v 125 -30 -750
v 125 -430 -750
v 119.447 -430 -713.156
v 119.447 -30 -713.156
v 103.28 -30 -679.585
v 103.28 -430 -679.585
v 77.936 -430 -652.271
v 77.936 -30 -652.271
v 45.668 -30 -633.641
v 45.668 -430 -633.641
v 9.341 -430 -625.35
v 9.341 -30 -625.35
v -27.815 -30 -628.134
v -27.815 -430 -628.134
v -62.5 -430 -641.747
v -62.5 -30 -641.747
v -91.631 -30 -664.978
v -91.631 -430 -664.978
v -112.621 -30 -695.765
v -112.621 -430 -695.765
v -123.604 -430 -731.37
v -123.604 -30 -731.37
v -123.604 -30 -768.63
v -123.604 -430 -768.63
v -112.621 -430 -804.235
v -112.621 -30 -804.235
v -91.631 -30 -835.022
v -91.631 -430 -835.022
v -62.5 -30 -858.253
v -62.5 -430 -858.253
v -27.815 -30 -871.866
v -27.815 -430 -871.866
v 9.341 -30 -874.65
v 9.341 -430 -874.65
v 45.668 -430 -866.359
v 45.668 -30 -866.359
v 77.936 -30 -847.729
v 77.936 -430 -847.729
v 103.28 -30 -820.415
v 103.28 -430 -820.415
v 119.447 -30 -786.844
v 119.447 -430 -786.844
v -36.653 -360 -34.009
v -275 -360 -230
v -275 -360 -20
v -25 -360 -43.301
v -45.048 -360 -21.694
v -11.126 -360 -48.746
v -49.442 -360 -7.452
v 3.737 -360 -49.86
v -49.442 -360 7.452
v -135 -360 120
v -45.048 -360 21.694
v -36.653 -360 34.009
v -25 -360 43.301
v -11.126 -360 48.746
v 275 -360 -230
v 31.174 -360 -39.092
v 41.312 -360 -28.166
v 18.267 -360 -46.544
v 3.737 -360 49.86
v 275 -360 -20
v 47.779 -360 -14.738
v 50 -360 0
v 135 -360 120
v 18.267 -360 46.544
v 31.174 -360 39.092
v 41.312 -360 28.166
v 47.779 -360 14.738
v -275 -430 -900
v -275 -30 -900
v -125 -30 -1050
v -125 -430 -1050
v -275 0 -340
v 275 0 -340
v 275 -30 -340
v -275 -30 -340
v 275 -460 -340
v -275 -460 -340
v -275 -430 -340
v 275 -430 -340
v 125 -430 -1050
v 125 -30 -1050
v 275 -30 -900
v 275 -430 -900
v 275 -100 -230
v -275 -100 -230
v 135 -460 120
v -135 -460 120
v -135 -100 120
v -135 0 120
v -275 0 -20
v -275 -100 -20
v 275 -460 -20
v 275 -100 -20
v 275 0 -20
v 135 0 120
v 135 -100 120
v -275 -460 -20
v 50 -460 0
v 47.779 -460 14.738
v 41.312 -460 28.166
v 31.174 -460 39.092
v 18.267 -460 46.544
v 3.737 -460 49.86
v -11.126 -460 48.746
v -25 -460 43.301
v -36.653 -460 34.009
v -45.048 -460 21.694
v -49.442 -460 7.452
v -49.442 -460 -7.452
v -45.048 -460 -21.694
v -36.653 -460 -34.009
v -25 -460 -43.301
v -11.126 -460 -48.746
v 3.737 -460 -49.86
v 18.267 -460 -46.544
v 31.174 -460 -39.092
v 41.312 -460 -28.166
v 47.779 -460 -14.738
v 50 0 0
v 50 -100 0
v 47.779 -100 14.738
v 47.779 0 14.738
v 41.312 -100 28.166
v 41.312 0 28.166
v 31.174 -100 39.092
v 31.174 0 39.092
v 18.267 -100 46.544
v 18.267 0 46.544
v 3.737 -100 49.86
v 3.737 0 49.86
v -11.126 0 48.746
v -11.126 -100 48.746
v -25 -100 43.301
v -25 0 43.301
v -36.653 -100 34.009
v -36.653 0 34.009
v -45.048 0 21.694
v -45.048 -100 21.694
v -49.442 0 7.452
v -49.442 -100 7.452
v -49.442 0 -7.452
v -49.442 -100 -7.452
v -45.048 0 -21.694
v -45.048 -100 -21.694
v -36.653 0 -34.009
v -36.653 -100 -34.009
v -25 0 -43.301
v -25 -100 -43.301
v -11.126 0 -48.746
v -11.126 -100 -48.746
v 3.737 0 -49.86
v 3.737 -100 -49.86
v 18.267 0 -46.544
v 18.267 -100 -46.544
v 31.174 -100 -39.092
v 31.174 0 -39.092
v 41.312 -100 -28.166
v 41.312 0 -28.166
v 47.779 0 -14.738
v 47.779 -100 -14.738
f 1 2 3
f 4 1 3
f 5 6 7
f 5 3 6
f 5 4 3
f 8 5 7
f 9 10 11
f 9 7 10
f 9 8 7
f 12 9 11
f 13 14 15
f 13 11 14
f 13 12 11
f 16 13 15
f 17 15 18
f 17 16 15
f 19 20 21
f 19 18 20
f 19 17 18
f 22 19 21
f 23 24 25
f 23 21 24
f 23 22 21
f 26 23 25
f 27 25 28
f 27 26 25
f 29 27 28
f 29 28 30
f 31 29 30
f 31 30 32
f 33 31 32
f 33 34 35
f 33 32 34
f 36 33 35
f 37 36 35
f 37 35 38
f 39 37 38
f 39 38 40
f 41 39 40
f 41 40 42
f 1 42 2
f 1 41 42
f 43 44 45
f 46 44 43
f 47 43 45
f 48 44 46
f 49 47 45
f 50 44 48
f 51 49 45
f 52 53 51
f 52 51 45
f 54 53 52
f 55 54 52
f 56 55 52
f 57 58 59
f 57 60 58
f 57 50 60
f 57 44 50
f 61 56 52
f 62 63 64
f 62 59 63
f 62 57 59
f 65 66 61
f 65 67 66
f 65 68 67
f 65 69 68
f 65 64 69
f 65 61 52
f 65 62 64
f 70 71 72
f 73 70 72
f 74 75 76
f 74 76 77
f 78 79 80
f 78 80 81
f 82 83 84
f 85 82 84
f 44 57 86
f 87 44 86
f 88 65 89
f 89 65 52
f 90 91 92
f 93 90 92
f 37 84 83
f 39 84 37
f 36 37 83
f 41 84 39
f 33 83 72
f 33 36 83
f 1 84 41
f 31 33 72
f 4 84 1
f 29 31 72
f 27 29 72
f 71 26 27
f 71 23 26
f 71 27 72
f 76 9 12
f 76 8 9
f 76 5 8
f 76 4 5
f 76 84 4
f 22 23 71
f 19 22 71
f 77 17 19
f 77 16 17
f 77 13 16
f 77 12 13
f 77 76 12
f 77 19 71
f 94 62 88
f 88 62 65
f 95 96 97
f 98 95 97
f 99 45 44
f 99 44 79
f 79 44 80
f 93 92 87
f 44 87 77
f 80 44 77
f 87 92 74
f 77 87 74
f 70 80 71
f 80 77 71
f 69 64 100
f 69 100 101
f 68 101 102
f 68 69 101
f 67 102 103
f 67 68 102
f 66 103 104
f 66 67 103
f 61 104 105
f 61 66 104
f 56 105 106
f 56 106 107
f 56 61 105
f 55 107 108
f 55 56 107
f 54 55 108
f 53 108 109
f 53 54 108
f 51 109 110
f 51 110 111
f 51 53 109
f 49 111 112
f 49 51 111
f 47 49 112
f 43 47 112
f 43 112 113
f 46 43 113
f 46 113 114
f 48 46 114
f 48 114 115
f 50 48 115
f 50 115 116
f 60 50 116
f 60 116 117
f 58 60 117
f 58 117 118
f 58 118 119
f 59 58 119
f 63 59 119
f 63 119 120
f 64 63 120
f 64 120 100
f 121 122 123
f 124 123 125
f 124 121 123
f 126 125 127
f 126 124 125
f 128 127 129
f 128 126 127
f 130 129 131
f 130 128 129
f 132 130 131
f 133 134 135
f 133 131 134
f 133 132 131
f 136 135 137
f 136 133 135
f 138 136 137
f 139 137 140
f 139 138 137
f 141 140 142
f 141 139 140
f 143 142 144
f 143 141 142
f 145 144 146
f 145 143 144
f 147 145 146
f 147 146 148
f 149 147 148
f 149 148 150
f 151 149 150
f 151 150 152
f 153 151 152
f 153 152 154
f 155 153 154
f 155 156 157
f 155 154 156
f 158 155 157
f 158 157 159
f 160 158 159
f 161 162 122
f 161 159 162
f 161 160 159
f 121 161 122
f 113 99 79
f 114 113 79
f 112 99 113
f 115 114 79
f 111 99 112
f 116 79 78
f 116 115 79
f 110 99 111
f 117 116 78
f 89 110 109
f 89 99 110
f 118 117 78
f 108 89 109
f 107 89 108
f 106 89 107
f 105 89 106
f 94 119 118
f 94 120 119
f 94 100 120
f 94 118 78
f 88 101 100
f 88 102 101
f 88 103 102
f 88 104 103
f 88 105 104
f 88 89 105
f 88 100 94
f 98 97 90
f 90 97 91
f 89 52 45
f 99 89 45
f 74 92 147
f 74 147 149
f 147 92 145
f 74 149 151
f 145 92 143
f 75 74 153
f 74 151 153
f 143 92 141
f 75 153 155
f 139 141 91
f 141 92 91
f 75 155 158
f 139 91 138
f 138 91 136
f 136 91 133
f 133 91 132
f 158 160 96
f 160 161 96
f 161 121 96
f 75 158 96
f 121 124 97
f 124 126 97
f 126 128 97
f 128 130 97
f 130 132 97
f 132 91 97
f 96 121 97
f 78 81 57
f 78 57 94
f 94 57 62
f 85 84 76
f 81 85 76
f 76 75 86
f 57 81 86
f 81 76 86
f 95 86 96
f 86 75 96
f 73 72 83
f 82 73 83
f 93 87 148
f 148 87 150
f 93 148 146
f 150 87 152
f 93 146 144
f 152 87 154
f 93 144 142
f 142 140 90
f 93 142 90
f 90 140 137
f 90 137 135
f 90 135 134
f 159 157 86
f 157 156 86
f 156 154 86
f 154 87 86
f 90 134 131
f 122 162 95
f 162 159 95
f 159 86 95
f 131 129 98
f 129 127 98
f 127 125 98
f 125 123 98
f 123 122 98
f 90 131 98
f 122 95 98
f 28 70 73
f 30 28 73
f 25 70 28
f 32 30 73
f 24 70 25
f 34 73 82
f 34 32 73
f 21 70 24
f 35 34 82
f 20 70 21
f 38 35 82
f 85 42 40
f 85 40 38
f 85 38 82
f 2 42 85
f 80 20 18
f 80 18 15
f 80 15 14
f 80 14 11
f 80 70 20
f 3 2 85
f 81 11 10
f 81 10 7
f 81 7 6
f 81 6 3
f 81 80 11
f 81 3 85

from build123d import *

# Parameters (mm, degrees)
F0_R     = 125
F0_R_2   = 50
F1_DEPTH = 460
F2_W     = 260
F2_H     = 420
F3_DEPTH = 550.001
F4_W     = 550
F4_H     = 710
F5_DEPTH = 30
F6_W     = 550
F6_H     = 710
F7_DEPTH = 30


with BuildPart() as f1:
    # F0 (on Front) → F1 (new body)
    with BuildSketch(Plane.XZ):
        Polygon((135, 120), (-135, 120), (-275, -20), (-275, -120), (-275, -900), (-125, -1050), (125, -1050), (275, -900), (275, -120), (275, -20), align=None)
        with Locations((0, -750)):
            Circle(F0_R, mode=Mode.SUBTRACT)
        Circle(F0_R_2, mode=Mode.SUBTRACT)
    extrude(amount=F1_DEPTH)

    # F2 (on face) → F3 (cut, through all)
    with BuildSketch(Plane.YZ.offset(275)):
        with Locations((-230, -20)):
            Rectangle(F2_W, F2_H)
    extrude(amount=-F3_DEPTH, mode=Mode.SUBTRACT)

    # F4 (on face) → F5 (cut)
    with BuildSketch(Plane(origin=(0, 0, 0), x_dir=(-1, 0, 0), z_dir=(0, 1, 0))):
        with Locations((0, -695)):
            Rectangle(F4_W, F4_H)
    extrude(amount=-F5_DEPTH, mode=Mode.SUBTRACT)

    # F6 (on face) → F7 (cut)
    with BuildSketch(Plane.XZ.offset(460)):
        with Locations((0, -695)):
            Rectangle(F6_W, F6_H)
    extrude(amount=-F7_DEPTH, mode=Mode.SUBTRACT)


solid = f1.part
